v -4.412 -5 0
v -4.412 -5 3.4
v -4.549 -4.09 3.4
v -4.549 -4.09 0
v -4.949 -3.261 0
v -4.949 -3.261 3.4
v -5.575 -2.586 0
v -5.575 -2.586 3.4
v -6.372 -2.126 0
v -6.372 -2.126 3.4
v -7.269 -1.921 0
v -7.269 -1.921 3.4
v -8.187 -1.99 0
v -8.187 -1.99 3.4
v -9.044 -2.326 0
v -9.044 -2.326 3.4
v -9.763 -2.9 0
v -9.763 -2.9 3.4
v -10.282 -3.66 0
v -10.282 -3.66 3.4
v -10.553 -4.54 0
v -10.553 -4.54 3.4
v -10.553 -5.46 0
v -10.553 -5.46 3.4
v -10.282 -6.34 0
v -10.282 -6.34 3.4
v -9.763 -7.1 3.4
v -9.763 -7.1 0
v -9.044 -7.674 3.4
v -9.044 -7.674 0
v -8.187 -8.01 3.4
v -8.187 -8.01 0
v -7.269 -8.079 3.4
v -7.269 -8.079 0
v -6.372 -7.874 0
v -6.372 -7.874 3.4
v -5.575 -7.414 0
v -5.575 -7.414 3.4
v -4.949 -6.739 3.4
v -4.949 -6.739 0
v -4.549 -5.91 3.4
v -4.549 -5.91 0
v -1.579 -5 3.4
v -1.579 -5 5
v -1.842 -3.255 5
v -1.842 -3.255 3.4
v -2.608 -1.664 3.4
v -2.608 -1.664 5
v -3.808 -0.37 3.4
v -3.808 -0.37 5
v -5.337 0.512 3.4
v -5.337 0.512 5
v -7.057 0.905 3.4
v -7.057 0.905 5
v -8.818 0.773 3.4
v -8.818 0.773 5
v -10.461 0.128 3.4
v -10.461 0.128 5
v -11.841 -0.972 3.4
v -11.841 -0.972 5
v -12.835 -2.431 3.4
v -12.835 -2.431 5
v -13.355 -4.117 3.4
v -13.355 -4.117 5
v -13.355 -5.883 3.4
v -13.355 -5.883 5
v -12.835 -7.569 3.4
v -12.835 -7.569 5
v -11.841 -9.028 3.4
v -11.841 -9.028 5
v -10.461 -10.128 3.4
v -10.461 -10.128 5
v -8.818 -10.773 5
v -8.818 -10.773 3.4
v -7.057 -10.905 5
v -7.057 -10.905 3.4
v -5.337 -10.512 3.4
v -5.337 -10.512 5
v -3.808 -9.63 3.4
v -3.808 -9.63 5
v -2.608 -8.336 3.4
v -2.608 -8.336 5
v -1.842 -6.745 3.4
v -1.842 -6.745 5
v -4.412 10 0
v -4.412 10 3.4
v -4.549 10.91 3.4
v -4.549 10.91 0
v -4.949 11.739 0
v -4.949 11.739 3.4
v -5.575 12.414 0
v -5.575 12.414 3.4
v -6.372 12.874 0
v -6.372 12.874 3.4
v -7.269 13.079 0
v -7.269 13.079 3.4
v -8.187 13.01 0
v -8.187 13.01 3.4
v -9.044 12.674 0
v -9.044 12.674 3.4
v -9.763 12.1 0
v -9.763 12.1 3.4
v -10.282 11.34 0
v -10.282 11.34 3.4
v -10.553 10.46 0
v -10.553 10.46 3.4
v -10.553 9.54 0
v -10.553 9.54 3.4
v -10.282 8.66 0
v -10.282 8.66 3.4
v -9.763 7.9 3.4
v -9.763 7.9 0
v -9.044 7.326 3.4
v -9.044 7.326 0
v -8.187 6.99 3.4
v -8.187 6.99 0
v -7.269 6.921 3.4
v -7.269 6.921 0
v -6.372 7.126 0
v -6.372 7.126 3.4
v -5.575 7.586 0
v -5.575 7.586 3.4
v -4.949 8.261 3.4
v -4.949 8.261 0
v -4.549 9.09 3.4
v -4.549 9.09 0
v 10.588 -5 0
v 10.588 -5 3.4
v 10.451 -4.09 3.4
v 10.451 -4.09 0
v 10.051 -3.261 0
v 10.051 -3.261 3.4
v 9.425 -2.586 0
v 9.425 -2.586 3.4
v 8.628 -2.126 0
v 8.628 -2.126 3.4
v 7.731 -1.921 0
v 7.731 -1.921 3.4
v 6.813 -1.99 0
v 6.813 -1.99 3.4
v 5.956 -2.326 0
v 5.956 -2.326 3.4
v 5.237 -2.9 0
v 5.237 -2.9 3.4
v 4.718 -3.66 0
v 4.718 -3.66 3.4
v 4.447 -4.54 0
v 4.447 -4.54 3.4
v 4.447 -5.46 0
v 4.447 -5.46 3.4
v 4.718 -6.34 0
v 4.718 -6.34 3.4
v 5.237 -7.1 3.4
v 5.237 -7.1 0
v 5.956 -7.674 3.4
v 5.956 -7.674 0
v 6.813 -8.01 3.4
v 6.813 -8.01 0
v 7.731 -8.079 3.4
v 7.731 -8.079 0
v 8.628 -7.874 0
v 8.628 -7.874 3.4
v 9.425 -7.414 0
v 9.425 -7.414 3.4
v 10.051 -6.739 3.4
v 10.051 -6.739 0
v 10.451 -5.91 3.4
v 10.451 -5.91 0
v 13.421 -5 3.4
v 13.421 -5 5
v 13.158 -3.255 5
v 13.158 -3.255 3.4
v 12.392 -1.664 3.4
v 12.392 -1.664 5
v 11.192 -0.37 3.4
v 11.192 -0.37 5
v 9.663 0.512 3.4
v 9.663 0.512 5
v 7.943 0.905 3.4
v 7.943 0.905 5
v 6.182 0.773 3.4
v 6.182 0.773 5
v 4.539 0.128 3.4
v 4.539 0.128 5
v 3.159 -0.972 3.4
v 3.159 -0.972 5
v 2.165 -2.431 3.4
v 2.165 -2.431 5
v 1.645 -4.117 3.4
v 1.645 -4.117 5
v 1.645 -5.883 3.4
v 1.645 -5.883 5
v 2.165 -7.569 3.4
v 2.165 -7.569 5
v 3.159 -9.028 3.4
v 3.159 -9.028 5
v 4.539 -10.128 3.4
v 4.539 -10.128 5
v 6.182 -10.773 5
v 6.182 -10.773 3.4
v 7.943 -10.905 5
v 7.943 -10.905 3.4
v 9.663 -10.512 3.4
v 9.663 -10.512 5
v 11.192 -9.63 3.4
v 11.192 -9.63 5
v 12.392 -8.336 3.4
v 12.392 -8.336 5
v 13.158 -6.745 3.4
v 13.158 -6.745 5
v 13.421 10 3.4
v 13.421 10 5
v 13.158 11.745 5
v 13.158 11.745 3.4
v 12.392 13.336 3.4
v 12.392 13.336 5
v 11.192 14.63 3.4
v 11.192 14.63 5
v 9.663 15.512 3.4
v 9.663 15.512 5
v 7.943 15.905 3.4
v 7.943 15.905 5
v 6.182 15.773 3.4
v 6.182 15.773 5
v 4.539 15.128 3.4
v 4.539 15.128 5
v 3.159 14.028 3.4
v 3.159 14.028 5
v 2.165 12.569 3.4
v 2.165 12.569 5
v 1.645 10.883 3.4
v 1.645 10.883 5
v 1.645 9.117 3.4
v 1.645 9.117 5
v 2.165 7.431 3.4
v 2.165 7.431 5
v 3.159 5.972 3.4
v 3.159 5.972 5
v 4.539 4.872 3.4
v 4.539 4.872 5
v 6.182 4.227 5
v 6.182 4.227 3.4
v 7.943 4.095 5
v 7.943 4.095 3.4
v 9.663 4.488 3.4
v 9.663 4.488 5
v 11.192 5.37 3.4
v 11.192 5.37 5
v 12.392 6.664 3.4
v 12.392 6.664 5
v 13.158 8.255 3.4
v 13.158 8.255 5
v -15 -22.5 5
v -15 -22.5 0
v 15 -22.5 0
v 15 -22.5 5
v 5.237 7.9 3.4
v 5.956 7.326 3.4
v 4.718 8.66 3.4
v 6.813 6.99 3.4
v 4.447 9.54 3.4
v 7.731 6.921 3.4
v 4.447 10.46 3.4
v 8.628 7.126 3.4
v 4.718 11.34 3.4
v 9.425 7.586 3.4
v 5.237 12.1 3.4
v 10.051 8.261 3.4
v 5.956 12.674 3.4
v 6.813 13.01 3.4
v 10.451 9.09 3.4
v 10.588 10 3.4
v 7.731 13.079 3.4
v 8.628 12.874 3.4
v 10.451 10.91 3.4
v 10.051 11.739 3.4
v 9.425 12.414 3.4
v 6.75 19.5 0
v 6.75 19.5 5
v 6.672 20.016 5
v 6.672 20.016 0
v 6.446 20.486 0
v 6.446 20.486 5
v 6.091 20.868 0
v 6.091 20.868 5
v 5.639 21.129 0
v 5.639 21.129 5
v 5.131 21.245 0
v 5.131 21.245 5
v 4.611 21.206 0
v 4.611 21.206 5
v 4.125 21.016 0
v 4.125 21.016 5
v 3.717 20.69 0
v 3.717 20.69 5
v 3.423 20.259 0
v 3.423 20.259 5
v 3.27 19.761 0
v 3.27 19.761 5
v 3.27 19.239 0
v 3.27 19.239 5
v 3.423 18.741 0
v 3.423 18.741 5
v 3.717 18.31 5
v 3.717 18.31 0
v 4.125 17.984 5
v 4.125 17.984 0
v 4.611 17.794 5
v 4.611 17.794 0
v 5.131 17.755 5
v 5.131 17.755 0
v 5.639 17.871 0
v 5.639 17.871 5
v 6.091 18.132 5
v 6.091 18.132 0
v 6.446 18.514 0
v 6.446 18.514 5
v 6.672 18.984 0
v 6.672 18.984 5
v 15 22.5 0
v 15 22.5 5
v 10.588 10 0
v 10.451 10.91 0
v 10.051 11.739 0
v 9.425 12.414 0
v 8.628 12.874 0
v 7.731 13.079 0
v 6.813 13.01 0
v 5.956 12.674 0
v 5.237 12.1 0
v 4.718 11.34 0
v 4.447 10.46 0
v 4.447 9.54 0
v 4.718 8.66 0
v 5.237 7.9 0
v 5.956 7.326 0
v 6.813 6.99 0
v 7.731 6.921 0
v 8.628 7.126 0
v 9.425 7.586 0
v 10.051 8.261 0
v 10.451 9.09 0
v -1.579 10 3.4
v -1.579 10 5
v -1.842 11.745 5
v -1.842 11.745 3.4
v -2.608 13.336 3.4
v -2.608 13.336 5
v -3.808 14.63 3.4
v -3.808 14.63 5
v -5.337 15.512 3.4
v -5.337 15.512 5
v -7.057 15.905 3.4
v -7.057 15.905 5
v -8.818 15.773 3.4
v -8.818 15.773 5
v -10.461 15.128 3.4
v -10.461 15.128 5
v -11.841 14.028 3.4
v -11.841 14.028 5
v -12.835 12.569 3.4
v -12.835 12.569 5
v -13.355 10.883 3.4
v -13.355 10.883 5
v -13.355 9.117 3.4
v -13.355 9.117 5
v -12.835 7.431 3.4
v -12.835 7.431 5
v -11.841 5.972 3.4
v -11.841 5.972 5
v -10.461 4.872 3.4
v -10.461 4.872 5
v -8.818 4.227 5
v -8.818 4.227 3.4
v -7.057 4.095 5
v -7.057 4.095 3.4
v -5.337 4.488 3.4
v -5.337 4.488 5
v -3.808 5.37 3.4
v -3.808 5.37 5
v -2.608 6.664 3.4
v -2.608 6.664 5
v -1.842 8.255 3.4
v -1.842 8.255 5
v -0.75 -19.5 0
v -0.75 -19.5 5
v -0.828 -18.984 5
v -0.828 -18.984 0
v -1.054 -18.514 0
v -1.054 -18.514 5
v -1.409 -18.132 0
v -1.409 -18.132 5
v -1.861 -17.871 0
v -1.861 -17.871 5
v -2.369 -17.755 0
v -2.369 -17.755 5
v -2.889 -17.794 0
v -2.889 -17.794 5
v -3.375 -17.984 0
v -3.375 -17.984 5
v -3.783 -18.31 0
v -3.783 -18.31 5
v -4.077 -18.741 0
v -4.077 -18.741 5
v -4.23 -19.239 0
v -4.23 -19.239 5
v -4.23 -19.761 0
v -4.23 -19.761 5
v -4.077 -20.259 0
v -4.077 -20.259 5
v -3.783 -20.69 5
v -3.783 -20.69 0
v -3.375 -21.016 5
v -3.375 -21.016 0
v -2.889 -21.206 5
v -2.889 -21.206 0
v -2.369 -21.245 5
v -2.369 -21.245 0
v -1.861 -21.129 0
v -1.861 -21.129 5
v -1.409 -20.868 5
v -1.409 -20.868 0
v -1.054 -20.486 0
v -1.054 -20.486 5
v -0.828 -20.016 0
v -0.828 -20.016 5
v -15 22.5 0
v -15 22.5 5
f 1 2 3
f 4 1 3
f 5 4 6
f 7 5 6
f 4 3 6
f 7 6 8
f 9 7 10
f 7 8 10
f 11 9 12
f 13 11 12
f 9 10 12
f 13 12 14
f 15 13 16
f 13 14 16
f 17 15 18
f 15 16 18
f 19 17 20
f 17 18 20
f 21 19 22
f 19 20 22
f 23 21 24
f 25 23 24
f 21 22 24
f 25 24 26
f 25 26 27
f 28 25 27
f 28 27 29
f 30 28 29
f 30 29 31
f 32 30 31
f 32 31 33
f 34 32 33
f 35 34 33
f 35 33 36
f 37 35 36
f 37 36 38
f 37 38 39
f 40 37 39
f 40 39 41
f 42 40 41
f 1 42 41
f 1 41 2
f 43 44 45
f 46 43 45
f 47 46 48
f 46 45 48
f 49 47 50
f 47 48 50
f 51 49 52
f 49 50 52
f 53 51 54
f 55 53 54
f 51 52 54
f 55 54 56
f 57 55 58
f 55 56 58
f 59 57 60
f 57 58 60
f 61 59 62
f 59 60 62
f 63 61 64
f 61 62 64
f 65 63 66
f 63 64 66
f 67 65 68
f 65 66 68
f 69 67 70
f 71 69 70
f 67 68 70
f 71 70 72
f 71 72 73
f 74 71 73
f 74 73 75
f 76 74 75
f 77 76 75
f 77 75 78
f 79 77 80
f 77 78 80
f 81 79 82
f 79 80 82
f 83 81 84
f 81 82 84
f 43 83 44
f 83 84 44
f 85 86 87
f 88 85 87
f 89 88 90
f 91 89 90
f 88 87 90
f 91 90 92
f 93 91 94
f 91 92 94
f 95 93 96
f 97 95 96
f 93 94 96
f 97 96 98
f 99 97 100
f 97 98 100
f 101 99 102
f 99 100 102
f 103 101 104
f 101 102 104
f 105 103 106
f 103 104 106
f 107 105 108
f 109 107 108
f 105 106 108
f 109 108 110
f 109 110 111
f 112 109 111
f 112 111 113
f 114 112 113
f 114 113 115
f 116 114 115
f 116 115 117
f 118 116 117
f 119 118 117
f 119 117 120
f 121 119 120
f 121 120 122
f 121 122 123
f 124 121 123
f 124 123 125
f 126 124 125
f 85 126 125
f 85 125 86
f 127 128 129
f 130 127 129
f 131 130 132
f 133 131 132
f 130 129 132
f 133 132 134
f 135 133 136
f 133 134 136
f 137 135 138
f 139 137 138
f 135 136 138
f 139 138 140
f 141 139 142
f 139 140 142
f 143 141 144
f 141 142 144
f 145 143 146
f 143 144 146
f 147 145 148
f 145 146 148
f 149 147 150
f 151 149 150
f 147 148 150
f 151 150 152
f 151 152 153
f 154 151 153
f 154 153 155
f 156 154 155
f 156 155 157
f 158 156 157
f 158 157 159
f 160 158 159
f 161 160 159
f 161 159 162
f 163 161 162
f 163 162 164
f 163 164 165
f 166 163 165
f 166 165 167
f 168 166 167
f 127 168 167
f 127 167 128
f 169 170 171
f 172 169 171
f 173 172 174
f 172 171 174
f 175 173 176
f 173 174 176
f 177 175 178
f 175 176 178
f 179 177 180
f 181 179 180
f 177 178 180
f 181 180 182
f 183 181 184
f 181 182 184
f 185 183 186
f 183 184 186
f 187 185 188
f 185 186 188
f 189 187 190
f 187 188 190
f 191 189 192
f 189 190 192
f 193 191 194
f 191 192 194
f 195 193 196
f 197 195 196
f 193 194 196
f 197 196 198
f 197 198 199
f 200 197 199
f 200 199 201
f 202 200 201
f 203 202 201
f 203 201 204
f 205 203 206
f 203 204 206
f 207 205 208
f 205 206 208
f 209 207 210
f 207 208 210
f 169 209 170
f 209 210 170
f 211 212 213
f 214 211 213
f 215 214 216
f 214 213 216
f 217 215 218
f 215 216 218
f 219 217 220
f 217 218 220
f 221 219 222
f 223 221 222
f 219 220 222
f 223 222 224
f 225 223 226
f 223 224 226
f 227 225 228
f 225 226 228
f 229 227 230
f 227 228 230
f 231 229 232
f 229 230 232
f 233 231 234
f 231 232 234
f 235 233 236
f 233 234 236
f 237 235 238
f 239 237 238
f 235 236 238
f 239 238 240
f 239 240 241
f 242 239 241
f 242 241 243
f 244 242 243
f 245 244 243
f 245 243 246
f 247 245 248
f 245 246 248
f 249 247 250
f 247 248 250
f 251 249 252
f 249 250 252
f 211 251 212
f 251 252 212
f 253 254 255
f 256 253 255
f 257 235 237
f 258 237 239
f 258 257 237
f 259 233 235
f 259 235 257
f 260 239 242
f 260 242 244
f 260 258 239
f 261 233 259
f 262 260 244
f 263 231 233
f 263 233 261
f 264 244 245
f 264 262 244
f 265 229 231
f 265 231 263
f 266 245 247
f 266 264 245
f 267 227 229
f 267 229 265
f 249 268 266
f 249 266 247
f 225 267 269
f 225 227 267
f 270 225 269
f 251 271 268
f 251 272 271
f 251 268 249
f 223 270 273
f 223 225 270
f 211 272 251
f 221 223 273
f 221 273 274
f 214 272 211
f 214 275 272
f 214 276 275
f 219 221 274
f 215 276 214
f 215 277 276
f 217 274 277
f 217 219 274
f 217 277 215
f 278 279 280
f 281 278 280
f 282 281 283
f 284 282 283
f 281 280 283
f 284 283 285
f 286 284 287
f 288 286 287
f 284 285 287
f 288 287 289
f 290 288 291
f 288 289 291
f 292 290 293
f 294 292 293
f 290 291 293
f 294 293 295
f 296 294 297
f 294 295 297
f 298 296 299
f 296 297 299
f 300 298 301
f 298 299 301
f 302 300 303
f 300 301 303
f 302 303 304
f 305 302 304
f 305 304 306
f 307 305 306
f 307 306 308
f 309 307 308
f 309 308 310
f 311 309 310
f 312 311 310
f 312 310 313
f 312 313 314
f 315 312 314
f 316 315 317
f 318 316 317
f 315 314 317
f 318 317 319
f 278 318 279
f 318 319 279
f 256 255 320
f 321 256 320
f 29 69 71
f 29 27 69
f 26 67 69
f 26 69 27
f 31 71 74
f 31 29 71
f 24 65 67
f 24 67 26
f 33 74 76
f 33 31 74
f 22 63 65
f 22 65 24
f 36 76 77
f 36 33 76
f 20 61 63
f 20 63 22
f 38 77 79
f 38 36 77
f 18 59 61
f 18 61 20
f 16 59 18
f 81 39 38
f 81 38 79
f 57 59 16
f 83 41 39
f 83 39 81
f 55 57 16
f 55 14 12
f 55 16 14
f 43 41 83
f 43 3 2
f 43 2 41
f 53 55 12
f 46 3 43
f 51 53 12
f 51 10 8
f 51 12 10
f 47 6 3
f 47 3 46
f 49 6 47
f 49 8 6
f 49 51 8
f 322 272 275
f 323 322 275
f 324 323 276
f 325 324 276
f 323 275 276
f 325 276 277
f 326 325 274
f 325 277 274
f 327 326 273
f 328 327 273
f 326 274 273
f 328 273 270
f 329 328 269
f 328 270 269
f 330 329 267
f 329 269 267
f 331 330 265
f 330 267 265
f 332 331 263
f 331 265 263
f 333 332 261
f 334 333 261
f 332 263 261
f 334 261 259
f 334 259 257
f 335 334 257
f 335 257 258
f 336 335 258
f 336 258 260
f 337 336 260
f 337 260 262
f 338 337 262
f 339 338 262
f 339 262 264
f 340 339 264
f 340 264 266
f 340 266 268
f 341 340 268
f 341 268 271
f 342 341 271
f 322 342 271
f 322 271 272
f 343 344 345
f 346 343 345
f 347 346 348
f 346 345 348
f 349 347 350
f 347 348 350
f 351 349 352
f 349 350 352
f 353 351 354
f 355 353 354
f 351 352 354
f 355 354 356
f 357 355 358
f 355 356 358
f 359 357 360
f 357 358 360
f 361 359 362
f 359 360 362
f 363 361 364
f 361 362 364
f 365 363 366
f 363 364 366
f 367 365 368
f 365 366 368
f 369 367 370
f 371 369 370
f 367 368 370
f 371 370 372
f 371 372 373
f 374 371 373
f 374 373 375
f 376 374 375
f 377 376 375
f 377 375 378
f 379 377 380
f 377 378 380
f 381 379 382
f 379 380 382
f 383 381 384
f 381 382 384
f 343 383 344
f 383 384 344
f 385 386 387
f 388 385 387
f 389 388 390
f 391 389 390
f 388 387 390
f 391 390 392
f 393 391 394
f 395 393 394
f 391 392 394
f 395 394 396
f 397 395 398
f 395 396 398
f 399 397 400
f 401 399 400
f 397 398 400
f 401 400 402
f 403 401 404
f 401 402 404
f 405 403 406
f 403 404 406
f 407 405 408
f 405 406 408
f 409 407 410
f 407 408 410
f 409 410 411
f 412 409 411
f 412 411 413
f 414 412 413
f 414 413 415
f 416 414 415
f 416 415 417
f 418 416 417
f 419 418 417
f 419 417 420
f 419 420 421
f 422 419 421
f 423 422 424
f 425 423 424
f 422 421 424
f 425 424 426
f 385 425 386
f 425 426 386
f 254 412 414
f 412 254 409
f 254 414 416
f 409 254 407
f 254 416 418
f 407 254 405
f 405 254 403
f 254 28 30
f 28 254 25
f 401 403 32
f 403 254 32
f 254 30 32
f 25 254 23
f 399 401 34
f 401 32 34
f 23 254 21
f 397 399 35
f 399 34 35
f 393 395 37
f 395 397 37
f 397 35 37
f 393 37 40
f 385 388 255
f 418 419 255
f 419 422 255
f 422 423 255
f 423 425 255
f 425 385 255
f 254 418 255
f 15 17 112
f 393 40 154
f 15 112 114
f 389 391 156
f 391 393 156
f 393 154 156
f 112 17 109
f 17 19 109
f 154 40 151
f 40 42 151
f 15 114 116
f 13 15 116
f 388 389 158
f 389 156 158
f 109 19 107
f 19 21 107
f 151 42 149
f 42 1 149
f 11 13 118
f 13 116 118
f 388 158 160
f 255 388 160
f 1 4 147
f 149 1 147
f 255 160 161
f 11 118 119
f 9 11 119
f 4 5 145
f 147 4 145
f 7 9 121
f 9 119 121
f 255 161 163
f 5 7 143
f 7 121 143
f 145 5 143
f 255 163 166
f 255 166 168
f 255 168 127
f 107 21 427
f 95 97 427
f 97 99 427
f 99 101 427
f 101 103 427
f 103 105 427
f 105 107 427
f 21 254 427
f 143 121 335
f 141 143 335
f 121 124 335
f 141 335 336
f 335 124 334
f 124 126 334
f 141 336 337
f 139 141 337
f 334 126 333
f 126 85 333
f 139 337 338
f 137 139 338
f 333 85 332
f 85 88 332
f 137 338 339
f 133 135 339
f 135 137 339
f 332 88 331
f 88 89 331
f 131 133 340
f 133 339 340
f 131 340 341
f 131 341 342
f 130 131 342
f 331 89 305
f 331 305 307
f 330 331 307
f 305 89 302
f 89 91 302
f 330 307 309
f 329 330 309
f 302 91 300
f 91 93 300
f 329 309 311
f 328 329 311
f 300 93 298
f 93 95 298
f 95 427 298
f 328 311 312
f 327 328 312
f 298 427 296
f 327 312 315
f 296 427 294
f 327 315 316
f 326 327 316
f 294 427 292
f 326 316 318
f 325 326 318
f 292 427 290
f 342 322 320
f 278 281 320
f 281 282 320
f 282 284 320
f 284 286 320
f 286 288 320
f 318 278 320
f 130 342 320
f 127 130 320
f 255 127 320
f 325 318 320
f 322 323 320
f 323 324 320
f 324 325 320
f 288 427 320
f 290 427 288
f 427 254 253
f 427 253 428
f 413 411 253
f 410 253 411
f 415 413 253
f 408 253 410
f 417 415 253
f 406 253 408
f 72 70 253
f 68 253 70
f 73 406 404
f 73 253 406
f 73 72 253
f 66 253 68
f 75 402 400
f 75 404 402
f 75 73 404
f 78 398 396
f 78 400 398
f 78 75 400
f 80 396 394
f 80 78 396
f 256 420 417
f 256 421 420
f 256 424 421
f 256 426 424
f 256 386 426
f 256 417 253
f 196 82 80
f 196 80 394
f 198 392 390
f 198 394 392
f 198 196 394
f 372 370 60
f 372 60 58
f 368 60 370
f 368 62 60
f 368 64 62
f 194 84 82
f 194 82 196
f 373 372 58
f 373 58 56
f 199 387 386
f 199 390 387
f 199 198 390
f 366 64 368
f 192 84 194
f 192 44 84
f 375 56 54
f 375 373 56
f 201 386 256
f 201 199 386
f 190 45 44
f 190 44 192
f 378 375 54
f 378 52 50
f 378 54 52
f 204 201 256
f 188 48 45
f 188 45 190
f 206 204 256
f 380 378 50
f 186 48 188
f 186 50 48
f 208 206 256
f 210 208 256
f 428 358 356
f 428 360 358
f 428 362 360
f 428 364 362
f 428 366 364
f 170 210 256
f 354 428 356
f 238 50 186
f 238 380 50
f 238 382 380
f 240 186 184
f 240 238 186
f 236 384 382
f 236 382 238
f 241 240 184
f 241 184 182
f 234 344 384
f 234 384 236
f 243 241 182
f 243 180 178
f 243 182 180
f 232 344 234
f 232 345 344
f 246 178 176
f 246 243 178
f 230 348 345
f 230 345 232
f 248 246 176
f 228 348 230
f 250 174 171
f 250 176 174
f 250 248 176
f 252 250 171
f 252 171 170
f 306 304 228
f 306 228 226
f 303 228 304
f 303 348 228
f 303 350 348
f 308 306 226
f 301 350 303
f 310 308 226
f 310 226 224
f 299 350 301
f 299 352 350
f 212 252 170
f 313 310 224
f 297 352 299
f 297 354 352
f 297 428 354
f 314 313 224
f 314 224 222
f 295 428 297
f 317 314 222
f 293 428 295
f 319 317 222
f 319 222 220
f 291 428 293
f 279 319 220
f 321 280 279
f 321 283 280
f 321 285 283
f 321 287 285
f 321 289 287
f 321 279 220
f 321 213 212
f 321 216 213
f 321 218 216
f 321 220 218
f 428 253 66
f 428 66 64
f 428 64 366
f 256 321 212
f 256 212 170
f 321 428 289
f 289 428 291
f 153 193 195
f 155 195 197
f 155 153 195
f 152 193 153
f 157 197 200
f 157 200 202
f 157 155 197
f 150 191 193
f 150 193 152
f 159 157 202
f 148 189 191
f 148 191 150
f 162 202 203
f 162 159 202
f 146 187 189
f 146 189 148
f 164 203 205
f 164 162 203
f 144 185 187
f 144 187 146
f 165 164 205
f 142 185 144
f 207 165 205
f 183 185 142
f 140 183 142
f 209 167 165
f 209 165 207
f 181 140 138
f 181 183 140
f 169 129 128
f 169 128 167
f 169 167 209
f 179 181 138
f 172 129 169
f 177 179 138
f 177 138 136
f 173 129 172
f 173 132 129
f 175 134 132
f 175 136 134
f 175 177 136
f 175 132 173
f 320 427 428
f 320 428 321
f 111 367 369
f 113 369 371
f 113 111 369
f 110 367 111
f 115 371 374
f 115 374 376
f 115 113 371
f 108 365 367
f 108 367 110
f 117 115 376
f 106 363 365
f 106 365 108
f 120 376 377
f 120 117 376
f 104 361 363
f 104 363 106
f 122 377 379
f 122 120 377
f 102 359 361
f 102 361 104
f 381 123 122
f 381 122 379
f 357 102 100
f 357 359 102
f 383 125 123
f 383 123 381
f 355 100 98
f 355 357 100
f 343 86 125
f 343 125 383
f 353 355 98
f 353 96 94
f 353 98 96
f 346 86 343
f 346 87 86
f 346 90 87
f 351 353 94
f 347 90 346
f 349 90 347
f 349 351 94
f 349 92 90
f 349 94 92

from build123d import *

# Parameters (mm, degrees)
F0_W     = 30
F0_H     = 45
F1_DEPTH = 5
F2_R     = 3.087688
F3_DEPTH = 5
F4_R     = 5.921375
F5_DEPTH = 1.6
F6_R     = 1.75
F7_DEPTH = 5


with BuildPart() as f1:
    # F0 (on Top) → F1 (new body)
    with BuildSketch(Plane.XY):
        Rectangle(F0_W, F0_H)
    extrude(amount=F1_DEPTH)

    # F2 (on face) → F3 (cut, through all)
    with BuildSketch(Plane.XY.offset(5)):
        with Locations((-7.5, 10)):
            Circle(F2_R)
        with Locations((-7.5, -5)):
            Circle(F2_R)
        with Locations((7.5, 10)):
            Circle(F2_R)
        with Locations((7.5, -5)):
            Circle(F2_R)
    extrude(amount=-F3_DEPTH, mode=Mode.SUBTRACT)

    # F4 (on face) → F5 (cut)
    with BuildSketch(Plane.XY.offset(5)):
        with Locations((-7.5, 10)):
            Circle(F4_R)
        with Locations((7.5, 10)):
            Circle(F4_R)
        with Locations((7.5, -5)):
            Circle(F4_R)
        with Locations((-7.5, -5)):
            Circle(F4_R)
    extrude(amount=-F5_DEPTH, mode=Mode.SUBTRACT)

    # F6 (on face) → F7 (cut, through all)
    with BuildSketch(Plane.XY.offset(5)):
        with Locations((5, 19.5)):
            Circle(F6_R)
        with Locations((-2.5, -19.5)):
            Circle(F6_R)
    extrude(amount=-F7_DEPTH, mode=Mode.SUBTRACT)


solid = f1.part
